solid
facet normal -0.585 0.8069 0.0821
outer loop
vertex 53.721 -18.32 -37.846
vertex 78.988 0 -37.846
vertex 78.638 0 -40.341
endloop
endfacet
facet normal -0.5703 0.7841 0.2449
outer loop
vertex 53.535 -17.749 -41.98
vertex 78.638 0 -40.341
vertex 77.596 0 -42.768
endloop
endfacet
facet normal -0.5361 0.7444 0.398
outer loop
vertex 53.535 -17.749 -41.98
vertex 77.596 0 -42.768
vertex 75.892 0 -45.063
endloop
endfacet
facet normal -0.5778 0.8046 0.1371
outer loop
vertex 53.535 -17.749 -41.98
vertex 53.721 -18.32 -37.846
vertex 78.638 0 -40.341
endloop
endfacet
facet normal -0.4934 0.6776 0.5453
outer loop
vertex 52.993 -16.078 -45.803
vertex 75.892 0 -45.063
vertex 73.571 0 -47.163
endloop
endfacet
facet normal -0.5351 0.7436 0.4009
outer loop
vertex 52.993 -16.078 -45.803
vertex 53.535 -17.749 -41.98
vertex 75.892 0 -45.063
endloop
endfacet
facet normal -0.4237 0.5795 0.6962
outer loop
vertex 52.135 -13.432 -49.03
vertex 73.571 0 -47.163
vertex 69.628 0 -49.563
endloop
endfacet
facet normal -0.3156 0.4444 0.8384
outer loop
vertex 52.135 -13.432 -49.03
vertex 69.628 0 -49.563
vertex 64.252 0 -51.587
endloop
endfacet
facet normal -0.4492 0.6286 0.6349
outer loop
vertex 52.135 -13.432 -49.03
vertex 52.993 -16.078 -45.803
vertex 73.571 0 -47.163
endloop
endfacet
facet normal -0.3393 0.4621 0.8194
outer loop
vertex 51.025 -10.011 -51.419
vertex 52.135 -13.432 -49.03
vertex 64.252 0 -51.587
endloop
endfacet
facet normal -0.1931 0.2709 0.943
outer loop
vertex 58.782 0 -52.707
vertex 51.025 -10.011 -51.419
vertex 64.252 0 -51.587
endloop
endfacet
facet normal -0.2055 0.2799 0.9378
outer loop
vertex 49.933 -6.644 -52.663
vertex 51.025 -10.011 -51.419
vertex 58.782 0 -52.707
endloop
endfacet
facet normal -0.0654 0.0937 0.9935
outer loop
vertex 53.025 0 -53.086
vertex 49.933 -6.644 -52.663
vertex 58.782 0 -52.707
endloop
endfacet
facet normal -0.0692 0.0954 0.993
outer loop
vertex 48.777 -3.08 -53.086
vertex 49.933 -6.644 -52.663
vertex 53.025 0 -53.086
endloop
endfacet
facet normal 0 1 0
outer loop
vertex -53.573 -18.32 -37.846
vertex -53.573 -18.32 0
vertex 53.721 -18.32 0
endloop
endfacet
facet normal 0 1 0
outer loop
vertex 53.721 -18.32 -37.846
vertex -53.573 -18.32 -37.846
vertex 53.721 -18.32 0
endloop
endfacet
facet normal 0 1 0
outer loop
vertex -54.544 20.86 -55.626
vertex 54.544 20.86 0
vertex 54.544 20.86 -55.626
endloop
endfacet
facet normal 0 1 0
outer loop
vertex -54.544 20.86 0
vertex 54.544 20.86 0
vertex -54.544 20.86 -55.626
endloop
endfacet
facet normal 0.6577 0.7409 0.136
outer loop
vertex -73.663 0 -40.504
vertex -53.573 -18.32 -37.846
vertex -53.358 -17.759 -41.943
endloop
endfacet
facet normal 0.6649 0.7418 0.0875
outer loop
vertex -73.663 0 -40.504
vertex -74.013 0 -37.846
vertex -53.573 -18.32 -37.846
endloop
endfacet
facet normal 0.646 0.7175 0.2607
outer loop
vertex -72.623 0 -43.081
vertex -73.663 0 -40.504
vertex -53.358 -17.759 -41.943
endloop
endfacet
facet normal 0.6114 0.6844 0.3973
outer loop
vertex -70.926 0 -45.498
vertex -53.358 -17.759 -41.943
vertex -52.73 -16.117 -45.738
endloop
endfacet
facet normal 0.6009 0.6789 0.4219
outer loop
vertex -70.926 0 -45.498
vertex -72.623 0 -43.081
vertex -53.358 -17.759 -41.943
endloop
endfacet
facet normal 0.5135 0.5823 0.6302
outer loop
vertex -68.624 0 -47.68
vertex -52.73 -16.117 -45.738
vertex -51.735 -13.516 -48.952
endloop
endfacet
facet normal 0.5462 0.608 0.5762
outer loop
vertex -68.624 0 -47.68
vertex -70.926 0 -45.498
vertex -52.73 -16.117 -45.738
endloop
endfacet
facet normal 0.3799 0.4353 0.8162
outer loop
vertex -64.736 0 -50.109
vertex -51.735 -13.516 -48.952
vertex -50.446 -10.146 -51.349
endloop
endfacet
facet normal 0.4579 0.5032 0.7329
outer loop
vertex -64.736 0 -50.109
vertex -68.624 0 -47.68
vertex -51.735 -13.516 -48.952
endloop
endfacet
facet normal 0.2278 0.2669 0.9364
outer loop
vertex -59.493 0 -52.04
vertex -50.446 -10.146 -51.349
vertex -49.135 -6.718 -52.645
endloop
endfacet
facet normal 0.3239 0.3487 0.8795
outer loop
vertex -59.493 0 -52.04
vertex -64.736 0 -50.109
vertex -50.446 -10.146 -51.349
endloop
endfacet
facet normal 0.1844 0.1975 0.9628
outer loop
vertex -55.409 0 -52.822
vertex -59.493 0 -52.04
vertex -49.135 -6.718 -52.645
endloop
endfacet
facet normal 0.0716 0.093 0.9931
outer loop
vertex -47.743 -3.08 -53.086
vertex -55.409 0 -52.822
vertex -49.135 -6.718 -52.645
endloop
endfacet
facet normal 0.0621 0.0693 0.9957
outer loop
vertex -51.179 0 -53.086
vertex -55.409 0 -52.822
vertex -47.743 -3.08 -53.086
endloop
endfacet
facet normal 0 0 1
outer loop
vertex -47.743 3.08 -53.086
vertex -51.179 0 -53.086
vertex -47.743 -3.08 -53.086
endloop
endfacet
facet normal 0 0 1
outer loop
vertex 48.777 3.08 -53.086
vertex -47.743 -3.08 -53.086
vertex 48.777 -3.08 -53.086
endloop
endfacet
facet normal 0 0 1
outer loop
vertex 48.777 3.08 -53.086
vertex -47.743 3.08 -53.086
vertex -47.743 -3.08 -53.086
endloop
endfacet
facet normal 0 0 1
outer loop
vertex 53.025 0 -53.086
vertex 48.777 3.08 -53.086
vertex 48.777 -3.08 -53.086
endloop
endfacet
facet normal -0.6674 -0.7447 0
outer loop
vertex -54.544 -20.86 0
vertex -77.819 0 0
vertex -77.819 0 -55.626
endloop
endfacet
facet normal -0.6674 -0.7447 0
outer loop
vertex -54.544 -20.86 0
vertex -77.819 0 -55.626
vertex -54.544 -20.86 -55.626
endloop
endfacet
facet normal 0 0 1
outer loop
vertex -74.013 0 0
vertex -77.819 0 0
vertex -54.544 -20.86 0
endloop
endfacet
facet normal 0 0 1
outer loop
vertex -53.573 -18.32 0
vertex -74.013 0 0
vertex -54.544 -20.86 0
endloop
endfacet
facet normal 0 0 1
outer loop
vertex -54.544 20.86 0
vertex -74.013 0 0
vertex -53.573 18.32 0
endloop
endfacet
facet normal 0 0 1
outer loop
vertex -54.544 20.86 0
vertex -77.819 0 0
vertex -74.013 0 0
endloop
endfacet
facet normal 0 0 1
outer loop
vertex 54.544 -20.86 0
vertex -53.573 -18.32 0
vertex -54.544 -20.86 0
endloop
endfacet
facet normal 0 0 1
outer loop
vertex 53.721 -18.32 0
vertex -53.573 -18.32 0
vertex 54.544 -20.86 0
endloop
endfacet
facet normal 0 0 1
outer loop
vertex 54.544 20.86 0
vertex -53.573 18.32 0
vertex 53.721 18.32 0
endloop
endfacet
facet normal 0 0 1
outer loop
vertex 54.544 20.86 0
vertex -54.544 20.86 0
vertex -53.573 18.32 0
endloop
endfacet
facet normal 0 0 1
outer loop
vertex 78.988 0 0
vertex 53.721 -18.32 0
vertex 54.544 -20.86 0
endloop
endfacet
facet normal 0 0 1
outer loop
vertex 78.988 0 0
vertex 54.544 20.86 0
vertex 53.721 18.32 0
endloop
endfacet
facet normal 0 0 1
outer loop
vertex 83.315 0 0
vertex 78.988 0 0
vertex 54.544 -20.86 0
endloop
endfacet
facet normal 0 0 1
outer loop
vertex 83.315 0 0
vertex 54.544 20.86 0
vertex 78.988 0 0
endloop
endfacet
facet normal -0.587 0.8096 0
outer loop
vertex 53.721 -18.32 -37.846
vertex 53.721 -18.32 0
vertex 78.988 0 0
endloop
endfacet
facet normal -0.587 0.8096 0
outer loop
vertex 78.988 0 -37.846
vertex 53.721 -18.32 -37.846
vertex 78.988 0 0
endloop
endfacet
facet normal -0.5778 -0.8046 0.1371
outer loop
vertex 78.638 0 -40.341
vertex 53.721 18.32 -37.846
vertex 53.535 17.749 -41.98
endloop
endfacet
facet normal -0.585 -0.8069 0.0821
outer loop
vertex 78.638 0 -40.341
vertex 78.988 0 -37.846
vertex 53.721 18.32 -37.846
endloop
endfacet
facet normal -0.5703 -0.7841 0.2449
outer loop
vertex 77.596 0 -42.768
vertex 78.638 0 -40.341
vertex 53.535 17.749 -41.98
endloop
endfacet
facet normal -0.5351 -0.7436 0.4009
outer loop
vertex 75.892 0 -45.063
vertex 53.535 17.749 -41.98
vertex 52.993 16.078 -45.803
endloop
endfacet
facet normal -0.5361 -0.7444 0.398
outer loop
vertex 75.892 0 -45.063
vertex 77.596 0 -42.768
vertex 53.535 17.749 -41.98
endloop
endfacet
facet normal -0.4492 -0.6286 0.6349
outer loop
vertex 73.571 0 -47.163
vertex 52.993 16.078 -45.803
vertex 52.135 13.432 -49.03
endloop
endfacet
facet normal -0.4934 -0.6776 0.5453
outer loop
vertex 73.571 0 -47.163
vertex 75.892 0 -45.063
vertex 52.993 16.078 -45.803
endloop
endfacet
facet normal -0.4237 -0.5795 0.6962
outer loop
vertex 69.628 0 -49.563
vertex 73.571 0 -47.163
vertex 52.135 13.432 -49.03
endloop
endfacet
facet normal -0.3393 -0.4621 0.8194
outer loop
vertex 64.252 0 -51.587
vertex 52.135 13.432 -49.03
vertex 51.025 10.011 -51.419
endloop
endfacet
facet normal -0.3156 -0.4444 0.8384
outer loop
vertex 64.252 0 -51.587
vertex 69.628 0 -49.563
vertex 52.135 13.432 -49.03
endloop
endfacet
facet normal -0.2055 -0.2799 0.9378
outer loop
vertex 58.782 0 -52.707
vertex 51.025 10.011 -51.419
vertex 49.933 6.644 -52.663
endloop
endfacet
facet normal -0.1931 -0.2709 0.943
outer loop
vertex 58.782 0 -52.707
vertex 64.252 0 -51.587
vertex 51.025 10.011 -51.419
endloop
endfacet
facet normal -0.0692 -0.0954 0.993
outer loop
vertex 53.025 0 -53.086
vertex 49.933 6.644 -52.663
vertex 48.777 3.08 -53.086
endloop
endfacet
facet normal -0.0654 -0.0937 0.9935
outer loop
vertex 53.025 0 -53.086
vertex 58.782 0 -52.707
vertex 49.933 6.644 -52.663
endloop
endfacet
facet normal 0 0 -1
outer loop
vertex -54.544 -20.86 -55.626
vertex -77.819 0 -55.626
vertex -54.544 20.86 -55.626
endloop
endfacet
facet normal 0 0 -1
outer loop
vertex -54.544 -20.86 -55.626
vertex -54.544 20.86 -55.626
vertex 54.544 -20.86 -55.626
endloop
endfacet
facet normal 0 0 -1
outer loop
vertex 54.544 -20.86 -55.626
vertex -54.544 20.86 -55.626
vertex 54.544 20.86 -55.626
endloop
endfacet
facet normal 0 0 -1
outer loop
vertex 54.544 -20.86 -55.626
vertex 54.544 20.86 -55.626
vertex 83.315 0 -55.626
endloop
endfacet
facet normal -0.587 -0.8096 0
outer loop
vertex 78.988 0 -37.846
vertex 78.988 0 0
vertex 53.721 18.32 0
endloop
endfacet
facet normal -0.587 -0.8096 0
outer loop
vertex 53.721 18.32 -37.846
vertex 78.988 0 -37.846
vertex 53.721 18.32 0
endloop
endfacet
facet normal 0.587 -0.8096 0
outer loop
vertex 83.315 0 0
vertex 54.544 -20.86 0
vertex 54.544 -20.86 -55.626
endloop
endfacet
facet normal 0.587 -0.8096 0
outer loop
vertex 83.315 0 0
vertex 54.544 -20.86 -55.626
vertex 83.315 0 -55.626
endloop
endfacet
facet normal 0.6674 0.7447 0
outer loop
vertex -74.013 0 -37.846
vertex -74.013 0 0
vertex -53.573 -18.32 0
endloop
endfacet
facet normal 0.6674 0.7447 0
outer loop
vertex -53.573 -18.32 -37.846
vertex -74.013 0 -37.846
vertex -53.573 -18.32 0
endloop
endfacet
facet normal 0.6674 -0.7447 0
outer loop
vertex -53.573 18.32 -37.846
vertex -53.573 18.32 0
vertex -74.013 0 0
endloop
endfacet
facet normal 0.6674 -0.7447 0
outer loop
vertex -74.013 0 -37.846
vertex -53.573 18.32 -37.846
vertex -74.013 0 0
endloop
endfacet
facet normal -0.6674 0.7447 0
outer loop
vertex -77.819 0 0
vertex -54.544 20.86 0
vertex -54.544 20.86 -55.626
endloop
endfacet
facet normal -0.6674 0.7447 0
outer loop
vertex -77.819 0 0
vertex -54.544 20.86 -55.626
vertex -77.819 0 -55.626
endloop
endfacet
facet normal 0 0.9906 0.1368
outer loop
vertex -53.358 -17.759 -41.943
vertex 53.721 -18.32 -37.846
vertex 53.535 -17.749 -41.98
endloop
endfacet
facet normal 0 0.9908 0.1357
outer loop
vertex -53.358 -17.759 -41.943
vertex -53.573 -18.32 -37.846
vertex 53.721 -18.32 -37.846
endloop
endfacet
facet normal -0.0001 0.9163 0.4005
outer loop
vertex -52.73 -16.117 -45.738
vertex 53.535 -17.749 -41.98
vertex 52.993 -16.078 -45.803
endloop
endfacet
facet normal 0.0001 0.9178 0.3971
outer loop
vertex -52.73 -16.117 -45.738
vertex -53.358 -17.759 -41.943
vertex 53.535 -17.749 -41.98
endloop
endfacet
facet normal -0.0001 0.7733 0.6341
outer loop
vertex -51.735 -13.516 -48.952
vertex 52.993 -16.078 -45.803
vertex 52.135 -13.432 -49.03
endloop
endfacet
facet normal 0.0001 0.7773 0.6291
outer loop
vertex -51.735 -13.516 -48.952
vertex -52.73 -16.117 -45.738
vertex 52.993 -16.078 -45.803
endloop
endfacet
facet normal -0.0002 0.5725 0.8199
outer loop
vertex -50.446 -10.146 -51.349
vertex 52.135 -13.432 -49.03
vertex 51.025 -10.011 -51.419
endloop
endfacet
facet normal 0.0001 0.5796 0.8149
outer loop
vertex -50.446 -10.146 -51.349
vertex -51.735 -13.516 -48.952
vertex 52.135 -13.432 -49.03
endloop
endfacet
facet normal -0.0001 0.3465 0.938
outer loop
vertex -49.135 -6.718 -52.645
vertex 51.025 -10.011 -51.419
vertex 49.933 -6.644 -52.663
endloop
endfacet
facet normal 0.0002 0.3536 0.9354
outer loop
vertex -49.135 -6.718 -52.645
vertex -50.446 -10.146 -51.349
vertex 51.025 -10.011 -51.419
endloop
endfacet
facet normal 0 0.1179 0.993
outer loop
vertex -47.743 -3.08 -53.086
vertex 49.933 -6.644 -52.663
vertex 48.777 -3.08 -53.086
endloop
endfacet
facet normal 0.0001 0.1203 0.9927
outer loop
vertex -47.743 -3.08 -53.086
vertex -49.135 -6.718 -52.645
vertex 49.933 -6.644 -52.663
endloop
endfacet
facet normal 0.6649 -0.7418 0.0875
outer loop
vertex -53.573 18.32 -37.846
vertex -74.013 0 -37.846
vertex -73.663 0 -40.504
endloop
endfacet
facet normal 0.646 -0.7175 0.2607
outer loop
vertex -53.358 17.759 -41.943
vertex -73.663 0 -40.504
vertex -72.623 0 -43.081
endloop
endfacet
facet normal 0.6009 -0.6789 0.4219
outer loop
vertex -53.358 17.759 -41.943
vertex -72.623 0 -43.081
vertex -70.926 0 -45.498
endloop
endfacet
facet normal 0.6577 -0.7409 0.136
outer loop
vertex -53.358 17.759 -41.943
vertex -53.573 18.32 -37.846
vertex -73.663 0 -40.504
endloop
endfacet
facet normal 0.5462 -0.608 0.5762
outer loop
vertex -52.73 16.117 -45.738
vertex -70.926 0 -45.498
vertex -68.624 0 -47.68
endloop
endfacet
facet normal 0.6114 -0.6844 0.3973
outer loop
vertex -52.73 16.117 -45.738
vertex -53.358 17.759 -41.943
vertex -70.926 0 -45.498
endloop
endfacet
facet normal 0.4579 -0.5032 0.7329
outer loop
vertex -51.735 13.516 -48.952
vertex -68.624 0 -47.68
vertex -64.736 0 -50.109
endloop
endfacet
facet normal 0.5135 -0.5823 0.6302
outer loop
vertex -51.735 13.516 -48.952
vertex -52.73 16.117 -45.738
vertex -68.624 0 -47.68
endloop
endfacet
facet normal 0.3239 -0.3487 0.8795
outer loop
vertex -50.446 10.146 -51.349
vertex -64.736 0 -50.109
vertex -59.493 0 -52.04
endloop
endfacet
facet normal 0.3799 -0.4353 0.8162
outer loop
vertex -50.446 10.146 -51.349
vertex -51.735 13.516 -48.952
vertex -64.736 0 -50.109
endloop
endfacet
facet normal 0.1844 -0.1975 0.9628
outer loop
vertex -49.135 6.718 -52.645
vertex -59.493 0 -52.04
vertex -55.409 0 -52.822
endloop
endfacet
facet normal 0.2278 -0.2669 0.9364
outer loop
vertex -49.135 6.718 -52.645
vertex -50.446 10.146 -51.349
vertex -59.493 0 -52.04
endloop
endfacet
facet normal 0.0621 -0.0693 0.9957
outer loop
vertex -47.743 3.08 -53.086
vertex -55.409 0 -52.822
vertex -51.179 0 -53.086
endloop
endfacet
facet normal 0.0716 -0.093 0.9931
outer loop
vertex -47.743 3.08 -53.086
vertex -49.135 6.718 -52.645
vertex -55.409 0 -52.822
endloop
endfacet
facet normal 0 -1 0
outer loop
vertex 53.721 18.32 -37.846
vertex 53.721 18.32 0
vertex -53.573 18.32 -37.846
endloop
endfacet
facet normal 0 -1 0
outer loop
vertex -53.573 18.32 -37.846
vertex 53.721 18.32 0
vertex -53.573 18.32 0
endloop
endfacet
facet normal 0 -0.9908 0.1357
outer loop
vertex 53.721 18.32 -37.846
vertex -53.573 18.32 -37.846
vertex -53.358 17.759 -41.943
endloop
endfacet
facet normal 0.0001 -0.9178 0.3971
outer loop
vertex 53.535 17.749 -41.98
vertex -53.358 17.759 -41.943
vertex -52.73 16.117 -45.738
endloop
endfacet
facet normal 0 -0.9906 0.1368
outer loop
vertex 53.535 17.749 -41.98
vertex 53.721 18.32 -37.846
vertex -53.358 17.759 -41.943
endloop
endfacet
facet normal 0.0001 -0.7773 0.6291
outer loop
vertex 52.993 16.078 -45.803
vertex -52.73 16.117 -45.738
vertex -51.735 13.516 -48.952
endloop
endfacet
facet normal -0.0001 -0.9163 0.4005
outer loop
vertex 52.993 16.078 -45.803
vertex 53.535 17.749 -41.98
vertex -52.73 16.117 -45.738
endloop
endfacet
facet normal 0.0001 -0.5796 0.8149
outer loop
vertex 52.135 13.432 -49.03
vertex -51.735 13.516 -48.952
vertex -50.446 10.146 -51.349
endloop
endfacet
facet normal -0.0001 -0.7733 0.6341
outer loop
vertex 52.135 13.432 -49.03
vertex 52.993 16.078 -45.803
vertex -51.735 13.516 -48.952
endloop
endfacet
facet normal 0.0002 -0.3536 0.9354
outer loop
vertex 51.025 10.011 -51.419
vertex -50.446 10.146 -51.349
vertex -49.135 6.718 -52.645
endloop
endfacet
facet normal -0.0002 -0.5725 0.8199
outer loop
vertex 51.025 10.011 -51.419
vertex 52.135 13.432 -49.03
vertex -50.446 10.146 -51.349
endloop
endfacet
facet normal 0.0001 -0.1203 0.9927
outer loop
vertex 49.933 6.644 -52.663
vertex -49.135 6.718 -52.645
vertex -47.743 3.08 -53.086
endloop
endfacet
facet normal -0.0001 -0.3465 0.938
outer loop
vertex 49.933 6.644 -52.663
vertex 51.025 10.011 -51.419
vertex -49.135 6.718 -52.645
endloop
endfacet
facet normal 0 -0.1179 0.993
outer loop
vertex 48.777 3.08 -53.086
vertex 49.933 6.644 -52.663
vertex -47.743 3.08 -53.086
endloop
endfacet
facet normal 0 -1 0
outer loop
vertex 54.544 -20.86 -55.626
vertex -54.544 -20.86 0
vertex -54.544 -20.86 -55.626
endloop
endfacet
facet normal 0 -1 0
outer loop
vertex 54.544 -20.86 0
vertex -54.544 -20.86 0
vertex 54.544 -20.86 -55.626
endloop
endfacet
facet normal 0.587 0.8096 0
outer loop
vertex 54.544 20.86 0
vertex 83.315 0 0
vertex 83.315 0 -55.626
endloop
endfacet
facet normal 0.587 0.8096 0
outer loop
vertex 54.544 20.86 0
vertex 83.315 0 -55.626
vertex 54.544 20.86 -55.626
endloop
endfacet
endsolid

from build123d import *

# Parameters (mm, degrees)
F1_DEPTH = 55.626
F2_T     = -2.54
F3_R     = 15.24


with BuildPart() as f1:
    # F0 (on Top) → F1 (new body)
    with BuildSketch(Plane.XY):
        Polygon((-54.5444576688, -20.85977979), (54.5444576688, -20.85977979), (83.3149626851, 0), (54.5444576688, 20.85977979), (-54.5444576688, 20.85977979), (-77.8186991811, 0), align=None)
    extrude(amount=-F1_DEPTH)

    # F2
    f2_openings = [f1.faces().sort_by_distance(p)[0] for p in [
        (1.462281, 0, 0),
    ]]
    offset(amount=F2_T, openings=f2_openings)

    # F3
    f3_edges = [f1.edges().sort_by_distance(p)[0] for p in [
        (-63.792905, 9.15989, -53.086),
        (-63.792905, -9.15989, -53.086),
        (0.07388, -18.31978, -53.086),
        (66.354169, -9.15989, -53.086),
        (66.354169, 9.15989, -53.086),
        (0.07388, 18.31978, -53.086),
    ]]
    fillet(f3_edges, radius=F3_R)


solid = f1.part
